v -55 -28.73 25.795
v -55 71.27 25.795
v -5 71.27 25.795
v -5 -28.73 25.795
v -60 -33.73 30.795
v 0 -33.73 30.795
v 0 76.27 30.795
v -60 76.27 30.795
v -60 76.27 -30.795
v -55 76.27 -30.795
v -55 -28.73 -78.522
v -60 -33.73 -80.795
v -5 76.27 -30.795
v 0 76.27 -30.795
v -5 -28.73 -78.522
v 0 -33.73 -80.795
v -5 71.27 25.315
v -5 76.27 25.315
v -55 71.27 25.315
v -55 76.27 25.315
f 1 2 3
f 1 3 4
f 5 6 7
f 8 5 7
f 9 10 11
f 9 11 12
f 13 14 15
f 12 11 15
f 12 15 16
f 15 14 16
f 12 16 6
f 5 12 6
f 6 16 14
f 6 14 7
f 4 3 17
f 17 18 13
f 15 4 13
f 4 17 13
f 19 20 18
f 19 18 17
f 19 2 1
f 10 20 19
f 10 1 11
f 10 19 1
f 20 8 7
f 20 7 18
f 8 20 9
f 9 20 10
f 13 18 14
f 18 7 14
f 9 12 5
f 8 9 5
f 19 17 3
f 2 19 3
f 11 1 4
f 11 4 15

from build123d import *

# Parameters (mm, degrees)
BOSS_EXTRUDE1_DEPTH     = 60
CUT_EXTRUDE1_DEPTH      = 25
CUT_EXTRUDE1_DEPTH_BACK = 25


with BuildPart() as part:
    # Sketch1 → Boss-Extrude1 (new body)
    with BuildSketch(Plane(origin=(0, 0, 0), x_dir=(0, 0, -1), z_dir=(1, 0, 0))):
        Polygon((30.795, 76.26991563), (80.795, -33.73008437), (-30.795, -33.73008437), (-30.795, 76.26991563), align=None)
    extrude(amount=-BOSS_EXTRUDE1_DEPTH)

    # Sketch2 → Cut-Extrude1 (cut, two sides: drawn at the far end of the back side and taken through both)
    with BuildSketch(Plane(origin=(-30, 0, 0), x_dir=(0, 0, -1), z_dir=(1, 0, 0)).offset(-CUT_EXTRUDE1_DEPTH_BACK)):
        Polygon((30.795, 76.26991563), (-25.315, 76.26991563), (-25.315, 71.26991563), (-25.795, 71.26991563), (-25.795, -28.73008437), (78.522272727, -28.73008437), align=None)
    extrude(amount=CUT_EXTRUDE1_DEPTH + CUT_EXTRUDE1_DEPTH_BACK, mode=Mode.SUBTRACT)


solid = part.part
